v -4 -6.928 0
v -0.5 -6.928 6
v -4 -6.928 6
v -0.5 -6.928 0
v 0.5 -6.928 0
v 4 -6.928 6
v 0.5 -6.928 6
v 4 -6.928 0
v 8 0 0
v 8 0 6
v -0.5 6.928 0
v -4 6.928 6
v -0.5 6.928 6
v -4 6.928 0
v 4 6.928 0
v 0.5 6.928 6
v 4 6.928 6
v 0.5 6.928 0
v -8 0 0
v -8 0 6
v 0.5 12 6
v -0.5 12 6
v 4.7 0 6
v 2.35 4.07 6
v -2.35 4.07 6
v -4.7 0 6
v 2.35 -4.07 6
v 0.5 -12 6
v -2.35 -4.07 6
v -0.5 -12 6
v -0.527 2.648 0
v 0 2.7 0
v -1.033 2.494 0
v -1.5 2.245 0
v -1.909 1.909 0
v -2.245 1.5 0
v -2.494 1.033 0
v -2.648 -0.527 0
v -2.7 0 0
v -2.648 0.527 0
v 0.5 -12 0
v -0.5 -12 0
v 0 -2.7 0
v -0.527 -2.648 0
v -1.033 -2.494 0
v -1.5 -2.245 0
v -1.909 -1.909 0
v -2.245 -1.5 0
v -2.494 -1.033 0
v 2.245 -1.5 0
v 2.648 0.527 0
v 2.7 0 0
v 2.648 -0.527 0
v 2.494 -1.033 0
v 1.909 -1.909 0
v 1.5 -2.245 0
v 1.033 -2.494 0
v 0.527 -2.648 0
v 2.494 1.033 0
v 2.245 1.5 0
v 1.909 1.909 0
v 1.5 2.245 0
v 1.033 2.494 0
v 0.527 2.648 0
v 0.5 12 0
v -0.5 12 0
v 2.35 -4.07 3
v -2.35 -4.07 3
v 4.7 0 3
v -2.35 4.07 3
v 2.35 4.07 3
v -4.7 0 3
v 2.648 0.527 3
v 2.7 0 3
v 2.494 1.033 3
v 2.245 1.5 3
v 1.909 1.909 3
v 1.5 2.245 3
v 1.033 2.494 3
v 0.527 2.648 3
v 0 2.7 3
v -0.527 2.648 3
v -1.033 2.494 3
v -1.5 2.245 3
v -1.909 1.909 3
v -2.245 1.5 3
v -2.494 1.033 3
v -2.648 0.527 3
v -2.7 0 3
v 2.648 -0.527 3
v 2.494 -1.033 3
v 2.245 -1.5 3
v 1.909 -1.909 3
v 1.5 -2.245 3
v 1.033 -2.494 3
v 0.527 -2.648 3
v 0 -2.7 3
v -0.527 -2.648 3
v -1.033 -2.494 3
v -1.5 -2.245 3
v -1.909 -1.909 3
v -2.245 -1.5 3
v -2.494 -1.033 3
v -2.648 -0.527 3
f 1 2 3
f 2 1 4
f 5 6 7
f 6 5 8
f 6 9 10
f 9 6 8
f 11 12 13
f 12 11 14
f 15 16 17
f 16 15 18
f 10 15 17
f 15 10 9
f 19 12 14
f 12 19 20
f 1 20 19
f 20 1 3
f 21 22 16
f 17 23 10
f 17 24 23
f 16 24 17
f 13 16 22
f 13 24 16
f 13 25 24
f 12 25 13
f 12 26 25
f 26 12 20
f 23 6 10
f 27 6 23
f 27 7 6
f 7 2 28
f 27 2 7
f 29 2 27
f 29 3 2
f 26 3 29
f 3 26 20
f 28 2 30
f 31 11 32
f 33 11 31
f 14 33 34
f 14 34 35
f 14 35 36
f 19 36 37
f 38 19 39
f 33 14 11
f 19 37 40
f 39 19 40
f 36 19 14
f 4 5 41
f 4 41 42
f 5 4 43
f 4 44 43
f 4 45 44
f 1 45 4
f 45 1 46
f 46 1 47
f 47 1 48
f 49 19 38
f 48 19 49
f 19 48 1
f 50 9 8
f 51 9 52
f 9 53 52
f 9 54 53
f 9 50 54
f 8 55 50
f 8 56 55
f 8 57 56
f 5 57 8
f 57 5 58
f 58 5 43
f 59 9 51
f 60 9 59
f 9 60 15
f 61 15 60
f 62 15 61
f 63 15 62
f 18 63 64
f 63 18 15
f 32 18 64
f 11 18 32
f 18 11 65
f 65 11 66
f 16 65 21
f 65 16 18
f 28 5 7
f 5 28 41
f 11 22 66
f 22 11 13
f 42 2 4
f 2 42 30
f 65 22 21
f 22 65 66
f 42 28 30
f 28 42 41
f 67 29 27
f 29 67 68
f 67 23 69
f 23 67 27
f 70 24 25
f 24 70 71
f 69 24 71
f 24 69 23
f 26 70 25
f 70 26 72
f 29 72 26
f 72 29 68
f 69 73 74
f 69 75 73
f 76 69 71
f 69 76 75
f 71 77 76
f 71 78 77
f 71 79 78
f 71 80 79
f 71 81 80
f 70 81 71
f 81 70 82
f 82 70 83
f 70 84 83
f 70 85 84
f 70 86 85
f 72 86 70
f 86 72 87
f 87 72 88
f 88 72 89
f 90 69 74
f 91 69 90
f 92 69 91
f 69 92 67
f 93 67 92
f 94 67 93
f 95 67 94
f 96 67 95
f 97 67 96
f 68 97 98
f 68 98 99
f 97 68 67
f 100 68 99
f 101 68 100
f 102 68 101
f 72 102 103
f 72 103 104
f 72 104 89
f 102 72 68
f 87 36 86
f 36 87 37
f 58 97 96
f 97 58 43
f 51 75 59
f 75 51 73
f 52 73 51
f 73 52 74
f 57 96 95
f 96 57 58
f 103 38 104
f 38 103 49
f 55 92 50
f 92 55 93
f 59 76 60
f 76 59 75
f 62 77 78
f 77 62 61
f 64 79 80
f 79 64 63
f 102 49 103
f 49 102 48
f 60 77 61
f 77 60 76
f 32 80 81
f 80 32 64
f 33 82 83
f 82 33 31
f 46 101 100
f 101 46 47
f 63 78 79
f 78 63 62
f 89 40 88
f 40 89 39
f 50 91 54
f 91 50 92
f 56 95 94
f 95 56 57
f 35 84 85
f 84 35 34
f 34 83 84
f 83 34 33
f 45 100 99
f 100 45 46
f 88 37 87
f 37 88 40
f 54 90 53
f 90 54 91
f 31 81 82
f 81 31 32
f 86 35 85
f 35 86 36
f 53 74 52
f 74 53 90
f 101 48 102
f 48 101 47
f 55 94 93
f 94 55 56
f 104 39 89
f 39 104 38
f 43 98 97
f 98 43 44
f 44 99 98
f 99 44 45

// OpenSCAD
$fn=32;

thick=6;
main_size=16;
screw_d=5.4;
screw_head=9.4;
wing_h=6;
wing_l=24;
wing_t=1;

difference() {
    union() {
        cylinder(h=thick,d=main_size,$fn=6);
        translate([0,0,wing_h/2])
            cube([1,wing_l,wing_h],center=true);
    }
    translate([0,0,thick-3])
        cylinder(h=main_size,d=screw_head,$fn=6);
    translate([0,0,-1])
        cylinder(h=main_size,d=screw_d);
}
